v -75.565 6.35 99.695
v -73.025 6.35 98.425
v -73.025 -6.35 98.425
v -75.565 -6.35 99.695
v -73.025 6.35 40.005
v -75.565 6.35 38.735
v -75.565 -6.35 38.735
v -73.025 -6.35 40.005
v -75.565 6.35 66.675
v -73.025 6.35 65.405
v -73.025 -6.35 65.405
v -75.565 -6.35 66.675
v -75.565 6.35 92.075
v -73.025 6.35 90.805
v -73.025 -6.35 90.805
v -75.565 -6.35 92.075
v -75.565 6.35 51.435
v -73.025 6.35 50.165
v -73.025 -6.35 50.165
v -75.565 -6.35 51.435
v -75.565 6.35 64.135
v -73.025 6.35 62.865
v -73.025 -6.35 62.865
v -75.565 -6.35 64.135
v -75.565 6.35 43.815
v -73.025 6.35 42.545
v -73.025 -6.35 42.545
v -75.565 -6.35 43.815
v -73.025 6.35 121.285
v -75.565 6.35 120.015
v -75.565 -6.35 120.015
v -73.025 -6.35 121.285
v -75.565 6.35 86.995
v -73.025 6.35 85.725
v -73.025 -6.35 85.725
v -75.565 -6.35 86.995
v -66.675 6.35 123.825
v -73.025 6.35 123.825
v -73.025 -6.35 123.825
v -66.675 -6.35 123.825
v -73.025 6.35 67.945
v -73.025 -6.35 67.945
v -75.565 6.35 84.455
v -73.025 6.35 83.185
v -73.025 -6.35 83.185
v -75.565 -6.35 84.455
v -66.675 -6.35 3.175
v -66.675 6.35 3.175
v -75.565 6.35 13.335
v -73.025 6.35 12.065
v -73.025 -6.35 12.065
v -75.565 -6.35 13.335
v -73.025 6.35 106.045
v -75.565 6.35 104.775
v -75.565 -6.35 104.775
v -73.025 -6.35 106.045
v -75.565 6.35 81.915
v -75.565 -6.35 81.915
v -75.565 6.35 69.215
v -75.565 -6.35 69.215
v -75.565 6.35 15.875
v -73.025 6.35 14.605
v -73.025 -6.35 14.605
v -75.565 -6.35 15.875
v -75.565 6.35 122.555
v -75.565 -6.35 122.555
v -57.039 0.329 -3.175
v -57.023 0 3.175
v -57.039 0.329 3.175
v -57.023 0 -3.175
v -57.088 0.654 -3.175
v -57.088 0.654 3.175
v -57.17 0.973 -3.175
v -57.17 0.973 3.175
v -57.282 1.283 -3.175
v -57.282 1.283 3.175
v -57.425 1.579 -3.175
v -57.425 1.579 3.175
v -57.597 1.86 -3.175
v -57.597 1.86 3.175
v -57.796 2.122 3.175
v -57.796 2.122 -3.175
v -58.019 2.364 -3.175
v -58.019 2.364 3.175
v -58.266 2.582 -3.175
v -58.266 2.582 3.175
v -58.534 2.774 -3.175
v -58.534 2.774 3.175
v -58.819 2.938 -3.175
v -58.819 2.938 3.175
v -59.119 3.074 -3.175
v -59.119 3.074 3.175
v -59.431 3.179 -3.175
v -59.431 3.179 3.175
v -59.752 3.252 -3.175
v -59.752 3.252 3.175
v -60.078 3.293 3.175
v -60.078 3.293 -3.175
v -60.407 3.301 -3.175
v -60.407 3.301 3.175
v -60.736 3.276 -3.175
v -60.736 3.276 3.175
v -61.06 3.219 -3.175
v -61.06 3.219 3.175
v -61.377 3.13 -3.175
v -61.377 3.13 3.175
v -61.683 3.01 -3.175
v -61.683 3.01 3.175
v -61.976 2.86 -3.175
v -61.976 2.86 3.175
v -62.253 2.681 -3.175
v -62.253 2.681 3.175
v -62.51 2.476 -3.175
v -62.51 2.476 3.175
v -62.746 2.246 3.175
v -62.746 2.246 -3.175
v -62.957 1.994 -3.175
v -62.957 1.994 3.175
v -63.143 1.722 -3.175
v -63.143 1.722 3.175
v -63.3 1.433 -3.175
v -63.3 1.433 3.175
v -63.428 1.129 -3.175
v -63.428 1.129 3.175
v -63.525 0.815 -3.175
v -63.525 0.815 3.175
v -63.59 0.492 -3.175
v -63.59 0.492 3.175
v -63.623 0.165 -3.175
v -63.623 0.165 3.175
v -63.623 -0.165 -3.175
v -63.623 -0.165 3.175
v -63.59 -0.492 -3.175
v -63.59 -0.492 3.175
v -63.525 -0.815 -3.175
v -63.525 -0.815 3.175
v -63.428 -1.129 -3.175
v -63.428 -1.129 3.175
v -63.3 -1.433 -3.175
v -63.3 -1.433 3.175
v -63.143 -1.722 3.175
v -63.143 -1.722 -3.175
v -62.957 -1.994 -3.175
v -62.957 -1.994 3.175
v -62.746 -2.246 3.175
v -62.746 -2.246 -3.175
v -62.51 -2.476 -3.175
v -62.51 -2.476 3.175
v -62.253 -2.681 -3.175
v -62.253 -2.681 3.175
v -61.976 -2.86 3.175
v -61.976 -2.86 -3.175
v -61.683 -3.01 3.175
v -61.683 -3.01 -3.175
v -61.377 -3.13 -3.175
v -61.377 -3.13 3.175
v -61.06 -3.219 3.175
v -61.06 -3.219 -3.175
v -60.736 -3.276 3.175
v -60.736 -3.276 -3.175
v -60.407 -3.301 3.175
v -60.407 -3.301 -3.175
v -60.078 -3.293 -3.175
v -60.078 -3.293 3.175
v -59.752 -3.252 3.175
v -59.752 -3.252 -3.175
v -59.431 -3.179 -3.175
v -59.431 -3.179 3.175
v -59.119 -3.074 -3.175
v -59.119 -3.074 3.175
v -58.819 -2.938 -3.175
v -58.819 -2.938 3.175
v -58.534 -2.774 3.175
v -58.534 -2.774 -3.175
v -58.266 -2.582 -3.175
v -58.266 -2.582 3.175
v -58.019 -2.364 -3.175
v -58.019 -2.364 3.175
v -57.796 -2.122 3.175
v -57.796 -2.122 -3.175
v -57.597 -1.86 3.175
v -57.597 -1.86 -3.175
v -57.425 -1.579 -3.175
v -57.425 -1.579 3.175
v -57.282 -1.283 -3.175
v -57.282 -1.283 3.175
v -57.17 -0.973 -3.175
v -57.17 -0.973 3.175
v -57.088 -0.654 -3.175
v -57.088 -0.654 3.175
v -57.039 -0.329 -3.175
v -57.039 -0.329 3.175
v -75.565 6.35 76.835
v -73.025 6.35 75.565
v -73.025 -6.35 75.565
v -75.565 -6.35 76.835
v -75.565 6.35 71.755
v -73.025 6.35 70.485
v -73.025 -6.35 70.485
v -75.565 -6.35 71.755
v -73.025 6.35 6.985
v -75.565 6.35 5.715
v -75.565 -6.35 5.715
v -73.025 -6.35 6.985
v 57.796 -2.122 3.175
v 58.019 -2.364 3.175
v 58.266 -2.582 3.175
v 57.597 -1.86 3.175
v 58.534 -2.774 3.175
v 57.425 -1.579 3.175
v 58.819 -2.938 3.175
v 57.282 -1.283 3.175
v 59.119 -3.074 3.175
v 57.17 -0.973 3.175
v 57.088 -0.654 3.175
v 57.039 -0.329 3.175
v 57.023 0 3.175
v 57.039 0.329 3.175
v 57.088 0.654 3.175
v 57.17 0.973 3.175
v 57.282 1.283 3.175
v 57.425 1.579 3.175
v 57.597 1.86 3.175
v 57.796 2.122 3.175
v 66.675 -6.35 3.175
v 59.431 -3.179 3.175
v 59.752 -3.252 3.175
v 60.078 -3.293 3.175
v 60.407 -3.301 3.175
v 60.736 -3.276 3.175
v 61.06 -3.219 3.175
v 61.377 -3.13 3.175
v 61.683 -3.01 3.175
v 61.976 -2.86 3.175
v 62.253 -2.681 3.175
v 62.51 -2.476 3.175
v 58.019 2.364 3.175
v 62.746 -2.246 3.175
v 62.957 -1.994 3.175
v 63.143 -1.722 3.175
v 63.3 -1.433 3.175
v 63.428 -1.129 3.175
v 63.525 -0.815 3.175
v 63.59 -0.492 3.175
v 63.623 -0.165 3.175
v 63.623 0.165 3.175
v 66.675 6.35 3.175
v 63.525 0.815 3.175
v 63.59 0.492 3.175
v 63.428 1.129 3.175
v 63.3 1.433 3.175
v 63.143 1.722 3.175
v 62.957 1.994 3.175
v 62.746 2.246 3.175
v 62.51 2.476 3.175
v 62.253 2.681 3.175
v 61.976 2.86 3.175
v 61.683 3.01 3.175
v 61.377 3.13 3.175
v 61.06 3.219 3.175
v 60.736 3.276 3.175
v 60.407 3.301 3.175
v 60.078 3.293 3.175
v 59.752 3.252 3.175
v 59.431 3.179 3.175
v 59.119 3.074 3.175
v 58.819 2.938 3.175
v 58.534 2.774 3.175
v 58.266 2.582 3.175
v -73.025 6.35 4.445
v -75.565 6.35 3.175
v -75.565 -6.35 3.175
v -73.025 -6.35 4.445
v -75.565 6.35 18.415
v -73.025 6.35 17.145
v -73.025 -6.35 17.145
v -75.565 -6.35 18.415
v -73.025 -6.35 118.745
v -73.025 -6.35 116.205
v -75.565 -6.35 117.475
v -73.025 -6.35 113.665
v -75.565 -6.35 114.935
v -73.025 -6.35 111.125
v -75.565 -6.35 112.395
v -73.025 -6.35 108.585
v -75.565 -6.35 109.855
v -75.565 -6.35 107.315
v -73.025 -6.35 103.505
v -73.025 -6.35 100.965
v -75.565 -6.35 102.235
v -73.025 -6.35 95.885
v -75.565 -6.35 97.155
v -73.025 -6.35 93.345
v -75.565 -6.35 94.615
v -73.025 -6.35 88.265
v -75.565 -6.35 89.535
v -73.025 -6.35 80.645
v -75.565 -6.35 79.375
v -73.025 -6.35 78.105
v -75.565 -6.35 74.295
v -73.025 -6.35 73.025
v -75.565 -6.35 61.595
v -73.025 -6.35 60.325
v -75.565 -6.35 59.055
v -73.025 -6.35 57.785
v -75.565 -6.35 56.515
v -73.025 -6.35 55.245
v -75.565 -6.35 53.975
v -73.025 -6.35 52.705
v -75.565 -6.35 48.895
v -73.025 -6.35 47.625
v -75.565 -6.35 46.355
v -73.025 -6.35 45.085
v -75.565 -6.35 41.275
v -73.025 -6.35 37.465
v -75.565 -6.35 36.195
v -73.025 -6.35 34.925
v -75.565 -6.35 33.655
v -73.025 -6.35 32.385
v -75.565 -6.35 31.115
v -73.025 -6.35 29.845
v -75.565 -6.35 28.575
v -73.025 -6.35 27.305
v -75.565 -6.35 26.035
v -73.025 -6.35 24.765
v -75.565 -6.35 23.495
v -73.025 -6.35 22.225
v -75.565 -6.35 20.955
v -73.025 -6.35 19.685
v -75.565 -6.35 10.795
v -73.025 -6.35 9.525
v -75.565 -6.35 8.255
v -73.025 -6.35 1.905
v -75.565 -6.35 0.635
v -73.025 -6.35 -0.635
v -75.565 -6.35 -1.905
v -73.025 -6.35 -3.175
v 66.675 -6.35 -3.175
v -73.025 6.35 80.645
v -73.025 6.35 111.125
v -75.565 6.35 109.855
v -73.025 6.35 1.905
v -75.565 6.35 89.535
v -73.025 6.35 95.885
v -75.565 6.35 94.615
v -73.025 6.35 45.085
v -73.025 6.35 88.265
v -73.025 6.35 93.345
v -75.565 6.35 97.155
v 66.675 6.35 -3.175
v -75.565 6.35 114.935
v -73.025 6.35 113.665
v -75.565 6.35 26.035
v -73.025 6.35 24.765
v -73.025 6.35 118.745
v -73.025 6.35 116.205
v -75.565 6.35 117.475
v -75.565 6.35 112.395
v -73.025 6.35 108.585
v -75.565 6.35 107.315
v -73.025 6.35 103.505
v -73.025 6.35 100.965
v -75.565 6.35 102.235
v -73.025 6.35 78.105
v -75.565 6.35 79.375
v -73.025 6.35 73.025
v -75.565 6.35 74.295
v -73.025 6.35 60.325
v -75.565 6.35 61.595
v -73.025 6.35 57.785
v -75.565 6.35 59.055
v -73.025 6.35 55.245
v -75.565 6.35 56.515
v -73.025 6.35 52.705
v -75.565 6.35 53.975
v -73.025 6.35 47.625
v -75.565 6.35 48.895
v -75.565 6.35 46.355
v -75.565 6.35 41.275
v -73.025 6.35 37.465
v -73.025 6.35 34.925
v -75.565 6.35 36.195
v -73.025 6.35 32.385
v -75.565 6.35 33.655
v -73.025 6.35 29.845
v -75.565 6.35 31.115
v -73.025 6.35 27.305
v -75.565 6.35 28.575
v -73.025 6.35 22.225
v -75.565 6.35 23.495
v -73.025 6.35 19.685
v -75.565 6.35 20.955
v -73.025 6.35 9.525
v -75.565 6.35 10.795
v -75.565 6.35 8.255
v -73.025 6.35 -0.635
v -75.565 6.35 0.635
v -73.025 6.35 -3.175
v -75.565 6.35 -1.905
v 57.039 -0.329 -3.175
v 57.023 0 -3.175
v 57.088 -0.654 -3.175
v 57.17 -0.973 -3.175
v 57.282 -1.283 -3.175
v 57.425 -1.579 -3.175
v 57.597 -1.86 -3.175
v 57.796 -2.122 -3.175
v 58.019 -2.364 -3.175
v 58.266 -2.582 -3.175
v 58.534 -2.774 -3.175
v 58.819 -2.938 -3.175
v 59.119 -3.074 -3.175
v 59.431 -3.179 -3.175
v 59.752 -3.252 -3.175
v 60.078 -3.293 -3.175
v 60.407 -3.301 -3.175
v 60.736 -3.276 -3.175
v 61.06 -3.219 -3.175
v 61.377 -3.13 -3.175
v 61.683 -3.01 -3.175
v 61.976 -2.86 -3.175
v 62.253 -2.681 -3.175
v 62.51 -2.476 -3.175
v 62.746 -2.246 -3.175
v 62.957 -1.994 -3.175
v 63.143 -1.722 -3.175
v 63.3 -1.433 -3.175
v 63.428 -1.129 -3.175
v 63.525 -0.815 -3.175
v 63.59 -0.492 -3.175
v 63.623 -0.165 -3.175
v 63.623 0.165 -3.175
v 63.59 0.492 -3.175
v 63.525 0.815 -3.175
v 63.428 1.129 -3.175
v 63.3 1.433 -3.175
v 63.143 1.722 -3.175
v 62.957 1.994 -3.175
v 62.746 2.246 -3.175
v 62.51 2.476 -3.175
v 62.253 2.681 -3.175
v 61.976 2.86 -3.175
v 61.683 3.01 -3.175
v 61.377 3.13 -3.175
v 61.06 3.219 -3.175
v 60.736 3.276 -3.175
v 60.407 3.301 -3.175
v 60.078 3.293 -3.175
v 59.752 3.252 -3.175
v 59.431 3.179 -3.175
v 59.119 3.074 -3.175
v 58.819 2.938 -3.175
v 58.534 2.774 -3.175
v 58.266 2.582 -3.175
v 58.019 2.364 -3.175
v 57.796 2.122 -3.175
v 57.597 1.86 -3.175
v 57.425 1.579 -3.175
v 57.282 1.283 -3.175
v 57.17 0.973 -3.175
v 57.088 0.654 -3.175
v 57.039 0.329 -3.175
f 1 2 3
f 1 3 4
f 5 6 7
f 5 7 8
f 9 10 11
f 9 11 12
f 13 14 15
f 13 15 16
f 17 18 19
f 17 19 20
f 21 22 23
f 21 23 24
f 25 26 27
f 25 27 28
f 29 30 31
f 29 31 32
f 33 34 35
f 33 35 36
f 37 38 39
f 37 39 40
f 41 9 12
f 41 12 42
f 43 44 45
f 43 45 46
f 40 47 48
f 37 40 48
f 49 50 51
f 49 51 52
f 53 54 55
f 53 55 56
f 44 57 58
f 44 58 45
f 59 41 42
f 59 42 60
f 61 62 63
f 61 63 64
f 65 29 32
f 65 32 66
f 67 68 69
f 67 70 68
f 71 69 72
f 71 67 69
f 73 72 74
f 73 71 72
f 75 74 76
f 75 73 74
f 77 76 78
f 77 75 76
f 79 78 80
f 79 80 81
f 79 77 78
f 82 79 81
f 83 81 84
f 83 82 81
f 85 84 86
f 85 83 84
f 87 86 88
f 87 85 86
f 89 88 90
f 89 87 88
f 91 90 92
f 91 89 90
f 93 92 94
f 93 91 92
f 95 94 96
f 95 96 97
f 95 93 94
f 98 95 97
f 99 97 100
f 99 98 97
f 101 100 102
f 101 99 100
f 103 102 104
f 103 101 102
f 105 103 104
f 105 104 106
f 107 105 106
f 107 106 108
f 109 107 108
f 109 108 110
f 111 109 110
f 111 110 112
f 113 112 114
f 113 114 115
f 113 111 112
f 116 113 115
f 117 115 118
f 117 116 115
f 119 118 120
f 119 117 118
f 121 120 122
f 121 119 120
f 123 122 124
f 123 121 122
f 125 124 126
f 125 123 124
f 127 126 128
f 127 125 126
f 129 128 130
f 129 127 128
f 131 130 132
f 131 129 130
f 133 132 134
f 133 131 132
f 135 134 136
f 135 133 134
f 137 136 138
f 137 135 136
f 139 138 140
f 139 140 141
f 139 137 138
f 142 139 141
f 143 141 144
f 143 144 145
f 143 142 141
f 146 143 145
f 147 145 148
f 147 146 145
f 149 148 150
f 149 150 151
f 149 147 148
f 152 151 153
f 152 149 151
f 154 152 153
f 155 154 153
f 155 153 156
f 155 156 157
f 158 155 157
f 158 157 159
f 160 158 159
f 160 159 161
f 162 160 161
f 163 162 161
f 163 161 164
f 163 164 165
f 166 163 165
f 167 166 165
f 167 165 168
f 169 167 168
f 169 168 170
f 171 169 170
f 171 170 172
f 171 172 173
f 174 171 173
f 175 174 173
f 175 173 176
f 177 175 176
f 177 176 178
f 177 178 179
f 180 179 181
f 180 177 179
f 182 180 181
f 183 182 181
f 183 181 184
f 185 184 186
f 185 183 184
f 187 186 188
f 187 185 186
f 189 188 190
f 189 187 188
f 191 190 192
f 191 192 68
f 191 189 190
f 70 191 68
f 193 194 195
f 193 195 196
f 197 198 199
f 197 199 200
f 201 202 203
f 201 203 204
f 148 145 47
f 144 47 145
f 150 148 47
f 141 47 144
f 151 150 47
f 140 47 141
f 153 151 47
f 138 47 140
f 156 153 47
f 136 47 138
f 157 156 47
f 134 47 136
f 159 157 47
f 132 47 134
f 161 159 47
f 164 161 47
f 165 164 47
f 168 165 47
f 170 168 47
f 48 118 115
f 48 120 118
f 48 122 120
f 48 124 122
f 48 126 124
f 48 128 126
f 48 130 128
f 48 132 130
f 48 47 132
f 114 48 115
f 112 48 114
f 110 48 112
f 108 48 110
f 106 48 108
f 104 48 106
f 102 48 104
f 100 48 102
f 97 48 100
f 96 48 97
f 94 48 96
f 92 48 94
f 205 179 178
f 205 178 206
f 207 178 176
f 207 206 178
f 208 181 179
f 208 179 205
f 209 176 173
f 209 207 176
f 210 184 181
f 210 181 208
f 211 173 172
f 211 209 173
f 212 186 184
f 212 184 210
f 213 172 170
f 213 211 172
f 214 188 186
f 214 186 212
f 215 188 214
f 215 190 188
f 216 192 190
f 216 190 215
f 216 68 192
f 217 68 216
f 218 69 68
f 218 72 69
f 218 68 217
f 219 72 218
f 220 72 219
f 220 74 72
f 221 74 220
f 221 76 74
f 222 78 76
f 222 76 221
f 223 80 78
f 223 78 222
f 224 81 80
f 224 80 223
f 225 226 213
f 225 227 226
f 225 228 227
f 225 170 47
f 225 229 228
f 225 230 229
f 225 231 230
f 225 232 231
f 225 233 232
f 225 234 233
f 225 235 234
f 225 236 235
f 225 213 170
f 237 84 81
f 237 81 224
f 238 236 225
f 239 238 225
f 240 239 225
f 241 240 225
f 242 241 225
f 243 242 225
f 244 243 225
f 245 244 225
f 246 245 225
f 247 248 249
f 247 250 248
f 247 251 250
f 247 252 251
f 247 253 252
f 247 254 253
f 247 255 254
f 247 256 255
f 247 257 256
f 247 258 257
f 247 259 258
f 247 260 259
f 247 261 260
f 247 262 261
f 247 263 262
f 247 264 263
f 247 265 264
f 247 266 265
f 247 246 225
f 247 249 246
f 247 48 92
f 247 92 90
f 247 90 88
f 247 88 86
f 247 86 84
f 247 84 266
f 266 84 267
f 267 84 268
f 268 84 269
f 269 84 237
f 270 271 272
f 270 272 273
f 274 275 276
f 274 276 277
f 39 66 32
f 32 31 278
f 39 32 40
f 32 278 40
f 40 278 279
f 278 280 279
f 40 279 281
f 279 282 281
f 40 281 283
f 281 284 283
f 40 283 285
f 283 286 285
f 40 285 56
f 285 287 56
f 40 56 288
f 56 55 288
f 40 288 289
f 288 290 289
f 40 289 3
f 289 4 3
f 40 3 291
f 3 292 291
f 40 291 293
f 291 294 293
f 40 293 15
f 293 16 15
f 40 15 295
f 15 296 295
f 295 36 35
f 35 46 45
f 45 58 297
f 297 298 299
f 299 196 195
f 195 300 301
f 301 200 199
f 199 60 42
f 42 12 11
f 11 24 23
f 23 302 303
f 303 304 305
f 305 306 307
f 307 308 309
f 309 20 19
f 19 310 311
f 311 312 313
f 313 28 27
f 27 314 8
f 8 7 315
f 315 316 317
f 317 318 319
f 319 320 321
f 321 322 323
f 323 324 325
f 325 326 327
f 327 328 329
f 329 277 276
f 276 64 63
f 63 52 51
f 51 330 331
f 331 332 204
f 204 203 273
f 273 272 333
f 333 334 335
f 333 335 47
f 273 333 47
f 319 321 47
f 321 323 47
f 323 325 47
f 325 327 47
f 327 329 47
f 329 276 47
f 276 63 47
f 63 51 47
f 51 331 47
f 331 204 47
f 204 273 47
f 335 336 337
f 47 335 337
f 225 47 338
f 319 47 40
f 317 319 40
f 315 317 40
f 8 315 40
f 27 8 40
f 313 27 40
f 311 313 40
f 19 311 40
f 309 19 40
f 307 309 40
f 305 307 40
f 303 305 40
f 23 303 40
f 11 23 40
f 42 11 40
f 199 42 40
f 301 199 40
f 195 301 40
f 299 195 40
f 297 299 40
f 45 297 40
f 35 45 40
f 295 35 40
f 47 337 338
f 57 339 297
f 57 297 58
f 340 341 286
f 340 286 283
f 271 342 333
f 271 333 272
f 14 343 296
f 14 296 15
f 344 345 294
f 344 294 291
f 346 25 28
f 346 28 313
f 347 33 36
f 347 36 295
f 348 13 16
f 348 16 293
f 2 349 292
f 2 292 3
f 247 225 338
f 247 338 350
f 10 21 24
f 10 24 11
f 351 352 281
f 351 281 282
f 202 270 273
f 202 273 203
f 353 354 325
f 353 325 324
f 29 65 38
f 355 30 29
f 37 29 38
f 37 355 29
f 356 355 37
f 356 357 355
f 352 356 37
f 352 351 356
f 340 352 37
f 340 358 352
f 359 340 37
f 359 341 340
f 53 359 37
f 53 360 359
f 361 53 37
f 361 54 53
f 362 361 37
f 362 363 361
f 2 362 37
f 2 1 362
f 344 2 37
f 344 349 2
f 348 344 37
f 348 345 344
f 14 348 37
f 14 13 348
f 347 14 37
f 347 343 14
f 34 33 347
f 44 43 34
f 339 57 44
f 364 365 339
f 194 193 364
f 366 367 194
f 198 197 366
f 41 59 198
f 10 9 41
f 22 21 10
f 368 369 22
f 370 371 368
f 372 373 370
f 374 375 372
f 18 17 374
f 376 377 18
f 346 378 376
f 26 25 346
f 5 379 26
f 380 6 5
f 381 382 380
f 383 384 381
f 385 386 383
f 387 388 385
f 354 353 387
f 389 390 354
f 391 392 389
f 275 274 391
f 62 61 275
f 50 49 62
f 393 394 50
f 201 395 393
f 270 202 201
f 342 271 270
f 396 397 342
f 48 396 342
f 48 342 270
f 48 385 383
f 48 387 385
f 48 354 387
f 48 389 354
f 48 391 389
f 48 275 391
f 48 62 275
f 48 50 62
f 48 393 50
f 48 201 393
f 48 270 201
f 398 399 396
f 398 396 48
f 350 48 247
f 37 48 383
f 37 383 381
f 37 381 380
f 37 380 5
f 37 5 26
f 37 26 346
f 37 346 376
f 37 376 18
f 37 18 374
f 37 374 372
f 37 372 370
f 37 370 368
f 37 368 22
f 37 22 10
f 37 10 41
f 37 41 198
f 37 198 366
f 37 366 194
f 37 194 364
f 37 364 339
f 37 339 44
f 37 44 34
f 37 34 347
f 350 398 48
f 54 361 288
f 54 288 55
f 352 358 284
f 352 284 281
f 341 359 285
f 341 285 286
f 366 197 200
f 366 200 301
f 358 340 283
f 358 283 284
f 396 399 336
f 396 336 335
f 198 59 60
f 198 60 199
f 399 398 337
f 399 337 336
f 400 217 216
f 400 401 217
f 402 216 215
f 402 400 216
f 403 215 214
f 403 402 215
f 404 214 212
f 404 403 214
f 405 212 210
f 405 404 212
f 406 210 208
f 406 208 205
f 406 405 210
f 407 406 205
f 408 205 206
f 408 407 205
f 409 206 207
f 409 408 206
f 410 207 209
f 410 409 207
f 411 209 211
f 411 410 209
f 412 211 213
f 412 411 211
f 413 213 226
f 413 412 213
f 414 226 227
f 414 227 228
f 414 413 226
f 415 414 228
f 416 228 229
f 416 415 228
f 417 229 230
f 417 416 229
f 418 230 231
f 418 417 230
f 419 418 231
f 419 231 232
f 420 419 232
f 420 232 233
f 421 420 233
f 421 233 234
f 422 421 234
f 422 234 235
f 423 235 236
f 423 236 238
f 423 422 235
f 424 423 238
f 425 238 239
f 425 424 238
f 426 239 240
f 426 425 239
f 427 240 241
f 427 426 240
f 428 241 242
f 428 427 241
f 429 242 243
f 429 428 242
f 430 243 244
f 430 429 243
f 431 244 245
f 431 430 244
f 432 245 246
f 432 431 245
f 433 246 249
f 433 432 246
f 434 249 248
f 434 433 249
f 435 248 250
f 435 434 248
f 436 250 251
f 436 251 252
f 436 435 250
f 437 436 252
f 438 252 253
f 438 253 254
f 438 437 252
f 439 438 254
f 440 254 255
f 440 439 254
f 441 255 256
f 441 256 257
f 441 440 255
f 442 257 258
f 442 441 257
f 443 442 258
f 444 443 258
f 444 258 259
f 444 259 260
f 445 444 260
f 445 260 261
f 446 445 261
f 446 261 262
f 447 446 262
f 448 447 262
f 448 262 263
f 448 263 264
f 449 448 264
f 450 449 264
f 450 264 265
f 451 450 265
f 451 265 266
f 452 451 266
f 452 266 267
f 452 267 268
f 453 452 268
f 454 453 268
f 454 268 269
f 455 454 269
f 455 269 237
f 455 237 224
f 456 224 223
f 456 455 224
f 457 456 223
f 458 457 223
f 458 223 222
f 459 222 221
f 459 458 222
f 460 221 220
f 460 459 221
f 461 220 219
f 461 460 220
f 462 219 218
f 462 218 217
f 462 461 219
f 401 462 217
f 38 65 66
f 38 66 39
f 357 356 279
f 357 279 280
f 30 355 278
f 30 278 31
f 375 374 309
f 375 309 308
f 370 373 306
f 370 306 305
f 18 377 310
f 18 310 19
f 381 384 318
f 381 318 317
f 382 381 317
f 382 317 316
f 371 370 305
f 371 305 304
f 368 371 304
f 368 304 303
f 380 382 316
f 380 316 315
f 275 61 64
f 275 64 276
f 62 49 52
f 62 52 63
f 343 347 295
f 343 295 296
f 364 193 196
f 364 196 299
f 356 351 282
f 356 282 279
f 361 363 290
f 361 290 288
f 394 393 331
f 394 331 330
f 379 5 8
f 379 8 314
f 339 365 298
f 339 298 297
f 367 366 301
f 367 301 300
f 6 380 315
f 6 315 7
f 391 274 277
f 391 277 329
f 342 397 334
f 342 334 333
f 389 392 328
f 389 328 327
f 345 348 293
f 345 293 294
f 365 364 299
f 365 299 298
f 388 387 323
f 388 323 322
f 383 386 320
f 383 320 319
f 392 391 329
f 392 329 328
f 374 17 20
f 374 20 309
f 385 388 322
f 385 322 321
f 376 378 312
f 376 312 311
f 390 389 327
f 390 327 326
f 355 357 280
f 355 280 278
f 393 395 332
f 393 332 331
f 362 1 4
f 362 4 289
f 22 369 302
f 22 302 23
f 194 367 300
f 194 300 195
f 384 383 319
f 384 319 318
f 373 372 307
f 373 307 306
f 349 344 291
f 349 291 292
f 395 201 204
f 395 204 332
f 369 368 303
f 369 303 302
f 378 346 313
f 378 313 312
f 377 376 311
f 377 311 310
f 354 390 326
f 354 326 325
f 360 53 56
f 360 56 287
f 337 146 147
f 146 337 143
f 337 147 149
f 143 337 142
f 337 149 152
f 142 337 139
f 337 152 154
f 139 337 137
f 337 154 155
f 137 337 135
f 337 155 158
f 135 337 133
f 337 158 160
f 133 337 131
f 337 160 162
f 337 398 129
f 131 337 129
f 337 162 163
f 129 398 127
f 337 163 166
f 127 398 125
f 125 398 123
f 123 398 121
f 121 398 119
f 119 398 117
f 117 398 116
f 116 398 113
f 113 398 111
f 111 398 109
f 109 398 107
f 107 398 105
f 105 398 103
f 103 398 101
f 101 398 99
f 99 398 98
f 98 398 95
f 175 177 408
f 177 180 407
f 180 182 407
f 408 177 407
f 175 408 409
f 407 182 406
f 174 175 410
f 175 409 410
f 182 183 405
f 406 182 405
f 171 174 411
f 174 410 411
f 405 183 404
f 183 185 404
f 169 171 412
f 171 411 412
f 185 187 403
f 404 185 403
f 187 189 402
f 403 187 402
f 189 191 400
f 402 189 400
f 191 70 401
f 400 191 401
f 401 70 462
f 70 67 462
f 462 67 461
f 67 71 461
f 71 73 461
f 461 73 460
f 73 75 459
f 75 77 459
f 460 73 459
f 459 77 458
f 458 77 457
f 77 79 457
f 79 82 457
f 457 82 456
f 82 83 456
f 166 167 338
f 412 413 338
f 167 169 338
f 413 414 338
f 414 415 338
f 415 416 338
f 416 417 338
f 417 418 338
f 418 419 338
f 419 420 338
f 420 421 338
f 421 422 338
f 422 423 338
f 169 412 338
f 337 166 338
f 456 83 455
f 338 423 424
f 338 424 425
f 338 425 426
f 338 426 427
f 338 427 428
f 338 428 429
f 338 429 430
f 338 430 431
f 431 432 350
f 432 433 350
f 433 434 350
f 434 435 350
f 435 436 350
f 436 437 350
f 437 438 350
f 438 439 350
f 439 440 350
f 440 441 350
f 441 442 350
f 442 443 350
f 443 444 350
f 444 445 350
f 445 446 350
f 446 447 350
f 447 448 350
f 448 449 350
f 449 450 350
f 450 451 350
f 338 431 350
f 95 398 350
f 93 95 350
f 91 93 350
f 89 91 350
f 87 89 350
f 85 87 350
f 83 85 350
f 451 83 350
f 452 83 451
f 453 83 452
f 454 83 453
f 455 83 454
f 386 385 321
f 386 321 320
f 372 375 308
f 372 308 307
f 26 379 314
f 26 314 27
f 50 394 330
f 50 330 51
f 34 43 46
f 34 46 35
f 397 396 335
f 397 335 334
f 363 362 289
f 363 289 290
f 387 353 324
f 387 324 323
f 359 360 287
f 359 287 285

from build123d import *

# Parameters (mm, degrees)
SKETCH1_W           = 133.35
SKETCH1_H           = 12.7
SKETCH1_R           = 3.302
BOSS_EXTRUDE1_DEPTH = 3.175
BOSS_EXTRUDE2_START = -3.175
SKETCH2_W           = 6.35
SKETCH2_H           = 12.7
BOSS_EXTRUDE2_DEPTH = 127
BOSS_EXTRUDE3_DEPTH = 12.7
LPATTERN1_COUNT     = 50
LPATTERN1_PITCH     = 2.54


with BuildPart() as part:
    # Sketch1 → Boss-Extrude1 (new, symmetric)
    with BuildSketch(Plane.XY):
        Rectangle(SKETCH1_W, SKETCH1_H)
        with Locations((-60.325, 0)):
            Circle(SKETCH1_R, mode=Mode.SUBTRACT)
        with Locations(Location((60.325, 0, 0), (0, 0, 180))):
            Circle(SKETCH1_R, mode=Mode.SUBTRACT)
    extrude(amount=BOSS_EXTRUDE1_DEPTH, both=True)

    # Sketch2 → Boss-Extrude2 (add)
    with BuildSketch(Plane.XY.offset(BOSS_EXTRUDE2_START)):
        with Locations((-69.85, 0)):
            Rectangle(SKETCH2_W, SKETCH2_H)
    extrude(amount=BOSS_EXTRUDE2_DEPTH)

    # Sketch4 → Boss-Extrude3 (add)
    with BuildSketch(Plane(origin=(0, 6.35, 0), x_dir=(1, 0, 0), z_dir=(0, 1, 0))):
        Polygon((-73.025, 3.175), (-75.565, 1.905), (-73.025, 0.635), align=None)
    boss_extrude3 = extrude(amount=-BOSS_EXTRUDE3_DEPTH)

    # LPattern1: Boss-Extrude3 ×50
    with Locations(*[(0, 0, i * LPATTERN1_PITCH) for i in range(1, LPATTERN1_COUNT)]):
        add(boss_extrude3)


solid = part.part
